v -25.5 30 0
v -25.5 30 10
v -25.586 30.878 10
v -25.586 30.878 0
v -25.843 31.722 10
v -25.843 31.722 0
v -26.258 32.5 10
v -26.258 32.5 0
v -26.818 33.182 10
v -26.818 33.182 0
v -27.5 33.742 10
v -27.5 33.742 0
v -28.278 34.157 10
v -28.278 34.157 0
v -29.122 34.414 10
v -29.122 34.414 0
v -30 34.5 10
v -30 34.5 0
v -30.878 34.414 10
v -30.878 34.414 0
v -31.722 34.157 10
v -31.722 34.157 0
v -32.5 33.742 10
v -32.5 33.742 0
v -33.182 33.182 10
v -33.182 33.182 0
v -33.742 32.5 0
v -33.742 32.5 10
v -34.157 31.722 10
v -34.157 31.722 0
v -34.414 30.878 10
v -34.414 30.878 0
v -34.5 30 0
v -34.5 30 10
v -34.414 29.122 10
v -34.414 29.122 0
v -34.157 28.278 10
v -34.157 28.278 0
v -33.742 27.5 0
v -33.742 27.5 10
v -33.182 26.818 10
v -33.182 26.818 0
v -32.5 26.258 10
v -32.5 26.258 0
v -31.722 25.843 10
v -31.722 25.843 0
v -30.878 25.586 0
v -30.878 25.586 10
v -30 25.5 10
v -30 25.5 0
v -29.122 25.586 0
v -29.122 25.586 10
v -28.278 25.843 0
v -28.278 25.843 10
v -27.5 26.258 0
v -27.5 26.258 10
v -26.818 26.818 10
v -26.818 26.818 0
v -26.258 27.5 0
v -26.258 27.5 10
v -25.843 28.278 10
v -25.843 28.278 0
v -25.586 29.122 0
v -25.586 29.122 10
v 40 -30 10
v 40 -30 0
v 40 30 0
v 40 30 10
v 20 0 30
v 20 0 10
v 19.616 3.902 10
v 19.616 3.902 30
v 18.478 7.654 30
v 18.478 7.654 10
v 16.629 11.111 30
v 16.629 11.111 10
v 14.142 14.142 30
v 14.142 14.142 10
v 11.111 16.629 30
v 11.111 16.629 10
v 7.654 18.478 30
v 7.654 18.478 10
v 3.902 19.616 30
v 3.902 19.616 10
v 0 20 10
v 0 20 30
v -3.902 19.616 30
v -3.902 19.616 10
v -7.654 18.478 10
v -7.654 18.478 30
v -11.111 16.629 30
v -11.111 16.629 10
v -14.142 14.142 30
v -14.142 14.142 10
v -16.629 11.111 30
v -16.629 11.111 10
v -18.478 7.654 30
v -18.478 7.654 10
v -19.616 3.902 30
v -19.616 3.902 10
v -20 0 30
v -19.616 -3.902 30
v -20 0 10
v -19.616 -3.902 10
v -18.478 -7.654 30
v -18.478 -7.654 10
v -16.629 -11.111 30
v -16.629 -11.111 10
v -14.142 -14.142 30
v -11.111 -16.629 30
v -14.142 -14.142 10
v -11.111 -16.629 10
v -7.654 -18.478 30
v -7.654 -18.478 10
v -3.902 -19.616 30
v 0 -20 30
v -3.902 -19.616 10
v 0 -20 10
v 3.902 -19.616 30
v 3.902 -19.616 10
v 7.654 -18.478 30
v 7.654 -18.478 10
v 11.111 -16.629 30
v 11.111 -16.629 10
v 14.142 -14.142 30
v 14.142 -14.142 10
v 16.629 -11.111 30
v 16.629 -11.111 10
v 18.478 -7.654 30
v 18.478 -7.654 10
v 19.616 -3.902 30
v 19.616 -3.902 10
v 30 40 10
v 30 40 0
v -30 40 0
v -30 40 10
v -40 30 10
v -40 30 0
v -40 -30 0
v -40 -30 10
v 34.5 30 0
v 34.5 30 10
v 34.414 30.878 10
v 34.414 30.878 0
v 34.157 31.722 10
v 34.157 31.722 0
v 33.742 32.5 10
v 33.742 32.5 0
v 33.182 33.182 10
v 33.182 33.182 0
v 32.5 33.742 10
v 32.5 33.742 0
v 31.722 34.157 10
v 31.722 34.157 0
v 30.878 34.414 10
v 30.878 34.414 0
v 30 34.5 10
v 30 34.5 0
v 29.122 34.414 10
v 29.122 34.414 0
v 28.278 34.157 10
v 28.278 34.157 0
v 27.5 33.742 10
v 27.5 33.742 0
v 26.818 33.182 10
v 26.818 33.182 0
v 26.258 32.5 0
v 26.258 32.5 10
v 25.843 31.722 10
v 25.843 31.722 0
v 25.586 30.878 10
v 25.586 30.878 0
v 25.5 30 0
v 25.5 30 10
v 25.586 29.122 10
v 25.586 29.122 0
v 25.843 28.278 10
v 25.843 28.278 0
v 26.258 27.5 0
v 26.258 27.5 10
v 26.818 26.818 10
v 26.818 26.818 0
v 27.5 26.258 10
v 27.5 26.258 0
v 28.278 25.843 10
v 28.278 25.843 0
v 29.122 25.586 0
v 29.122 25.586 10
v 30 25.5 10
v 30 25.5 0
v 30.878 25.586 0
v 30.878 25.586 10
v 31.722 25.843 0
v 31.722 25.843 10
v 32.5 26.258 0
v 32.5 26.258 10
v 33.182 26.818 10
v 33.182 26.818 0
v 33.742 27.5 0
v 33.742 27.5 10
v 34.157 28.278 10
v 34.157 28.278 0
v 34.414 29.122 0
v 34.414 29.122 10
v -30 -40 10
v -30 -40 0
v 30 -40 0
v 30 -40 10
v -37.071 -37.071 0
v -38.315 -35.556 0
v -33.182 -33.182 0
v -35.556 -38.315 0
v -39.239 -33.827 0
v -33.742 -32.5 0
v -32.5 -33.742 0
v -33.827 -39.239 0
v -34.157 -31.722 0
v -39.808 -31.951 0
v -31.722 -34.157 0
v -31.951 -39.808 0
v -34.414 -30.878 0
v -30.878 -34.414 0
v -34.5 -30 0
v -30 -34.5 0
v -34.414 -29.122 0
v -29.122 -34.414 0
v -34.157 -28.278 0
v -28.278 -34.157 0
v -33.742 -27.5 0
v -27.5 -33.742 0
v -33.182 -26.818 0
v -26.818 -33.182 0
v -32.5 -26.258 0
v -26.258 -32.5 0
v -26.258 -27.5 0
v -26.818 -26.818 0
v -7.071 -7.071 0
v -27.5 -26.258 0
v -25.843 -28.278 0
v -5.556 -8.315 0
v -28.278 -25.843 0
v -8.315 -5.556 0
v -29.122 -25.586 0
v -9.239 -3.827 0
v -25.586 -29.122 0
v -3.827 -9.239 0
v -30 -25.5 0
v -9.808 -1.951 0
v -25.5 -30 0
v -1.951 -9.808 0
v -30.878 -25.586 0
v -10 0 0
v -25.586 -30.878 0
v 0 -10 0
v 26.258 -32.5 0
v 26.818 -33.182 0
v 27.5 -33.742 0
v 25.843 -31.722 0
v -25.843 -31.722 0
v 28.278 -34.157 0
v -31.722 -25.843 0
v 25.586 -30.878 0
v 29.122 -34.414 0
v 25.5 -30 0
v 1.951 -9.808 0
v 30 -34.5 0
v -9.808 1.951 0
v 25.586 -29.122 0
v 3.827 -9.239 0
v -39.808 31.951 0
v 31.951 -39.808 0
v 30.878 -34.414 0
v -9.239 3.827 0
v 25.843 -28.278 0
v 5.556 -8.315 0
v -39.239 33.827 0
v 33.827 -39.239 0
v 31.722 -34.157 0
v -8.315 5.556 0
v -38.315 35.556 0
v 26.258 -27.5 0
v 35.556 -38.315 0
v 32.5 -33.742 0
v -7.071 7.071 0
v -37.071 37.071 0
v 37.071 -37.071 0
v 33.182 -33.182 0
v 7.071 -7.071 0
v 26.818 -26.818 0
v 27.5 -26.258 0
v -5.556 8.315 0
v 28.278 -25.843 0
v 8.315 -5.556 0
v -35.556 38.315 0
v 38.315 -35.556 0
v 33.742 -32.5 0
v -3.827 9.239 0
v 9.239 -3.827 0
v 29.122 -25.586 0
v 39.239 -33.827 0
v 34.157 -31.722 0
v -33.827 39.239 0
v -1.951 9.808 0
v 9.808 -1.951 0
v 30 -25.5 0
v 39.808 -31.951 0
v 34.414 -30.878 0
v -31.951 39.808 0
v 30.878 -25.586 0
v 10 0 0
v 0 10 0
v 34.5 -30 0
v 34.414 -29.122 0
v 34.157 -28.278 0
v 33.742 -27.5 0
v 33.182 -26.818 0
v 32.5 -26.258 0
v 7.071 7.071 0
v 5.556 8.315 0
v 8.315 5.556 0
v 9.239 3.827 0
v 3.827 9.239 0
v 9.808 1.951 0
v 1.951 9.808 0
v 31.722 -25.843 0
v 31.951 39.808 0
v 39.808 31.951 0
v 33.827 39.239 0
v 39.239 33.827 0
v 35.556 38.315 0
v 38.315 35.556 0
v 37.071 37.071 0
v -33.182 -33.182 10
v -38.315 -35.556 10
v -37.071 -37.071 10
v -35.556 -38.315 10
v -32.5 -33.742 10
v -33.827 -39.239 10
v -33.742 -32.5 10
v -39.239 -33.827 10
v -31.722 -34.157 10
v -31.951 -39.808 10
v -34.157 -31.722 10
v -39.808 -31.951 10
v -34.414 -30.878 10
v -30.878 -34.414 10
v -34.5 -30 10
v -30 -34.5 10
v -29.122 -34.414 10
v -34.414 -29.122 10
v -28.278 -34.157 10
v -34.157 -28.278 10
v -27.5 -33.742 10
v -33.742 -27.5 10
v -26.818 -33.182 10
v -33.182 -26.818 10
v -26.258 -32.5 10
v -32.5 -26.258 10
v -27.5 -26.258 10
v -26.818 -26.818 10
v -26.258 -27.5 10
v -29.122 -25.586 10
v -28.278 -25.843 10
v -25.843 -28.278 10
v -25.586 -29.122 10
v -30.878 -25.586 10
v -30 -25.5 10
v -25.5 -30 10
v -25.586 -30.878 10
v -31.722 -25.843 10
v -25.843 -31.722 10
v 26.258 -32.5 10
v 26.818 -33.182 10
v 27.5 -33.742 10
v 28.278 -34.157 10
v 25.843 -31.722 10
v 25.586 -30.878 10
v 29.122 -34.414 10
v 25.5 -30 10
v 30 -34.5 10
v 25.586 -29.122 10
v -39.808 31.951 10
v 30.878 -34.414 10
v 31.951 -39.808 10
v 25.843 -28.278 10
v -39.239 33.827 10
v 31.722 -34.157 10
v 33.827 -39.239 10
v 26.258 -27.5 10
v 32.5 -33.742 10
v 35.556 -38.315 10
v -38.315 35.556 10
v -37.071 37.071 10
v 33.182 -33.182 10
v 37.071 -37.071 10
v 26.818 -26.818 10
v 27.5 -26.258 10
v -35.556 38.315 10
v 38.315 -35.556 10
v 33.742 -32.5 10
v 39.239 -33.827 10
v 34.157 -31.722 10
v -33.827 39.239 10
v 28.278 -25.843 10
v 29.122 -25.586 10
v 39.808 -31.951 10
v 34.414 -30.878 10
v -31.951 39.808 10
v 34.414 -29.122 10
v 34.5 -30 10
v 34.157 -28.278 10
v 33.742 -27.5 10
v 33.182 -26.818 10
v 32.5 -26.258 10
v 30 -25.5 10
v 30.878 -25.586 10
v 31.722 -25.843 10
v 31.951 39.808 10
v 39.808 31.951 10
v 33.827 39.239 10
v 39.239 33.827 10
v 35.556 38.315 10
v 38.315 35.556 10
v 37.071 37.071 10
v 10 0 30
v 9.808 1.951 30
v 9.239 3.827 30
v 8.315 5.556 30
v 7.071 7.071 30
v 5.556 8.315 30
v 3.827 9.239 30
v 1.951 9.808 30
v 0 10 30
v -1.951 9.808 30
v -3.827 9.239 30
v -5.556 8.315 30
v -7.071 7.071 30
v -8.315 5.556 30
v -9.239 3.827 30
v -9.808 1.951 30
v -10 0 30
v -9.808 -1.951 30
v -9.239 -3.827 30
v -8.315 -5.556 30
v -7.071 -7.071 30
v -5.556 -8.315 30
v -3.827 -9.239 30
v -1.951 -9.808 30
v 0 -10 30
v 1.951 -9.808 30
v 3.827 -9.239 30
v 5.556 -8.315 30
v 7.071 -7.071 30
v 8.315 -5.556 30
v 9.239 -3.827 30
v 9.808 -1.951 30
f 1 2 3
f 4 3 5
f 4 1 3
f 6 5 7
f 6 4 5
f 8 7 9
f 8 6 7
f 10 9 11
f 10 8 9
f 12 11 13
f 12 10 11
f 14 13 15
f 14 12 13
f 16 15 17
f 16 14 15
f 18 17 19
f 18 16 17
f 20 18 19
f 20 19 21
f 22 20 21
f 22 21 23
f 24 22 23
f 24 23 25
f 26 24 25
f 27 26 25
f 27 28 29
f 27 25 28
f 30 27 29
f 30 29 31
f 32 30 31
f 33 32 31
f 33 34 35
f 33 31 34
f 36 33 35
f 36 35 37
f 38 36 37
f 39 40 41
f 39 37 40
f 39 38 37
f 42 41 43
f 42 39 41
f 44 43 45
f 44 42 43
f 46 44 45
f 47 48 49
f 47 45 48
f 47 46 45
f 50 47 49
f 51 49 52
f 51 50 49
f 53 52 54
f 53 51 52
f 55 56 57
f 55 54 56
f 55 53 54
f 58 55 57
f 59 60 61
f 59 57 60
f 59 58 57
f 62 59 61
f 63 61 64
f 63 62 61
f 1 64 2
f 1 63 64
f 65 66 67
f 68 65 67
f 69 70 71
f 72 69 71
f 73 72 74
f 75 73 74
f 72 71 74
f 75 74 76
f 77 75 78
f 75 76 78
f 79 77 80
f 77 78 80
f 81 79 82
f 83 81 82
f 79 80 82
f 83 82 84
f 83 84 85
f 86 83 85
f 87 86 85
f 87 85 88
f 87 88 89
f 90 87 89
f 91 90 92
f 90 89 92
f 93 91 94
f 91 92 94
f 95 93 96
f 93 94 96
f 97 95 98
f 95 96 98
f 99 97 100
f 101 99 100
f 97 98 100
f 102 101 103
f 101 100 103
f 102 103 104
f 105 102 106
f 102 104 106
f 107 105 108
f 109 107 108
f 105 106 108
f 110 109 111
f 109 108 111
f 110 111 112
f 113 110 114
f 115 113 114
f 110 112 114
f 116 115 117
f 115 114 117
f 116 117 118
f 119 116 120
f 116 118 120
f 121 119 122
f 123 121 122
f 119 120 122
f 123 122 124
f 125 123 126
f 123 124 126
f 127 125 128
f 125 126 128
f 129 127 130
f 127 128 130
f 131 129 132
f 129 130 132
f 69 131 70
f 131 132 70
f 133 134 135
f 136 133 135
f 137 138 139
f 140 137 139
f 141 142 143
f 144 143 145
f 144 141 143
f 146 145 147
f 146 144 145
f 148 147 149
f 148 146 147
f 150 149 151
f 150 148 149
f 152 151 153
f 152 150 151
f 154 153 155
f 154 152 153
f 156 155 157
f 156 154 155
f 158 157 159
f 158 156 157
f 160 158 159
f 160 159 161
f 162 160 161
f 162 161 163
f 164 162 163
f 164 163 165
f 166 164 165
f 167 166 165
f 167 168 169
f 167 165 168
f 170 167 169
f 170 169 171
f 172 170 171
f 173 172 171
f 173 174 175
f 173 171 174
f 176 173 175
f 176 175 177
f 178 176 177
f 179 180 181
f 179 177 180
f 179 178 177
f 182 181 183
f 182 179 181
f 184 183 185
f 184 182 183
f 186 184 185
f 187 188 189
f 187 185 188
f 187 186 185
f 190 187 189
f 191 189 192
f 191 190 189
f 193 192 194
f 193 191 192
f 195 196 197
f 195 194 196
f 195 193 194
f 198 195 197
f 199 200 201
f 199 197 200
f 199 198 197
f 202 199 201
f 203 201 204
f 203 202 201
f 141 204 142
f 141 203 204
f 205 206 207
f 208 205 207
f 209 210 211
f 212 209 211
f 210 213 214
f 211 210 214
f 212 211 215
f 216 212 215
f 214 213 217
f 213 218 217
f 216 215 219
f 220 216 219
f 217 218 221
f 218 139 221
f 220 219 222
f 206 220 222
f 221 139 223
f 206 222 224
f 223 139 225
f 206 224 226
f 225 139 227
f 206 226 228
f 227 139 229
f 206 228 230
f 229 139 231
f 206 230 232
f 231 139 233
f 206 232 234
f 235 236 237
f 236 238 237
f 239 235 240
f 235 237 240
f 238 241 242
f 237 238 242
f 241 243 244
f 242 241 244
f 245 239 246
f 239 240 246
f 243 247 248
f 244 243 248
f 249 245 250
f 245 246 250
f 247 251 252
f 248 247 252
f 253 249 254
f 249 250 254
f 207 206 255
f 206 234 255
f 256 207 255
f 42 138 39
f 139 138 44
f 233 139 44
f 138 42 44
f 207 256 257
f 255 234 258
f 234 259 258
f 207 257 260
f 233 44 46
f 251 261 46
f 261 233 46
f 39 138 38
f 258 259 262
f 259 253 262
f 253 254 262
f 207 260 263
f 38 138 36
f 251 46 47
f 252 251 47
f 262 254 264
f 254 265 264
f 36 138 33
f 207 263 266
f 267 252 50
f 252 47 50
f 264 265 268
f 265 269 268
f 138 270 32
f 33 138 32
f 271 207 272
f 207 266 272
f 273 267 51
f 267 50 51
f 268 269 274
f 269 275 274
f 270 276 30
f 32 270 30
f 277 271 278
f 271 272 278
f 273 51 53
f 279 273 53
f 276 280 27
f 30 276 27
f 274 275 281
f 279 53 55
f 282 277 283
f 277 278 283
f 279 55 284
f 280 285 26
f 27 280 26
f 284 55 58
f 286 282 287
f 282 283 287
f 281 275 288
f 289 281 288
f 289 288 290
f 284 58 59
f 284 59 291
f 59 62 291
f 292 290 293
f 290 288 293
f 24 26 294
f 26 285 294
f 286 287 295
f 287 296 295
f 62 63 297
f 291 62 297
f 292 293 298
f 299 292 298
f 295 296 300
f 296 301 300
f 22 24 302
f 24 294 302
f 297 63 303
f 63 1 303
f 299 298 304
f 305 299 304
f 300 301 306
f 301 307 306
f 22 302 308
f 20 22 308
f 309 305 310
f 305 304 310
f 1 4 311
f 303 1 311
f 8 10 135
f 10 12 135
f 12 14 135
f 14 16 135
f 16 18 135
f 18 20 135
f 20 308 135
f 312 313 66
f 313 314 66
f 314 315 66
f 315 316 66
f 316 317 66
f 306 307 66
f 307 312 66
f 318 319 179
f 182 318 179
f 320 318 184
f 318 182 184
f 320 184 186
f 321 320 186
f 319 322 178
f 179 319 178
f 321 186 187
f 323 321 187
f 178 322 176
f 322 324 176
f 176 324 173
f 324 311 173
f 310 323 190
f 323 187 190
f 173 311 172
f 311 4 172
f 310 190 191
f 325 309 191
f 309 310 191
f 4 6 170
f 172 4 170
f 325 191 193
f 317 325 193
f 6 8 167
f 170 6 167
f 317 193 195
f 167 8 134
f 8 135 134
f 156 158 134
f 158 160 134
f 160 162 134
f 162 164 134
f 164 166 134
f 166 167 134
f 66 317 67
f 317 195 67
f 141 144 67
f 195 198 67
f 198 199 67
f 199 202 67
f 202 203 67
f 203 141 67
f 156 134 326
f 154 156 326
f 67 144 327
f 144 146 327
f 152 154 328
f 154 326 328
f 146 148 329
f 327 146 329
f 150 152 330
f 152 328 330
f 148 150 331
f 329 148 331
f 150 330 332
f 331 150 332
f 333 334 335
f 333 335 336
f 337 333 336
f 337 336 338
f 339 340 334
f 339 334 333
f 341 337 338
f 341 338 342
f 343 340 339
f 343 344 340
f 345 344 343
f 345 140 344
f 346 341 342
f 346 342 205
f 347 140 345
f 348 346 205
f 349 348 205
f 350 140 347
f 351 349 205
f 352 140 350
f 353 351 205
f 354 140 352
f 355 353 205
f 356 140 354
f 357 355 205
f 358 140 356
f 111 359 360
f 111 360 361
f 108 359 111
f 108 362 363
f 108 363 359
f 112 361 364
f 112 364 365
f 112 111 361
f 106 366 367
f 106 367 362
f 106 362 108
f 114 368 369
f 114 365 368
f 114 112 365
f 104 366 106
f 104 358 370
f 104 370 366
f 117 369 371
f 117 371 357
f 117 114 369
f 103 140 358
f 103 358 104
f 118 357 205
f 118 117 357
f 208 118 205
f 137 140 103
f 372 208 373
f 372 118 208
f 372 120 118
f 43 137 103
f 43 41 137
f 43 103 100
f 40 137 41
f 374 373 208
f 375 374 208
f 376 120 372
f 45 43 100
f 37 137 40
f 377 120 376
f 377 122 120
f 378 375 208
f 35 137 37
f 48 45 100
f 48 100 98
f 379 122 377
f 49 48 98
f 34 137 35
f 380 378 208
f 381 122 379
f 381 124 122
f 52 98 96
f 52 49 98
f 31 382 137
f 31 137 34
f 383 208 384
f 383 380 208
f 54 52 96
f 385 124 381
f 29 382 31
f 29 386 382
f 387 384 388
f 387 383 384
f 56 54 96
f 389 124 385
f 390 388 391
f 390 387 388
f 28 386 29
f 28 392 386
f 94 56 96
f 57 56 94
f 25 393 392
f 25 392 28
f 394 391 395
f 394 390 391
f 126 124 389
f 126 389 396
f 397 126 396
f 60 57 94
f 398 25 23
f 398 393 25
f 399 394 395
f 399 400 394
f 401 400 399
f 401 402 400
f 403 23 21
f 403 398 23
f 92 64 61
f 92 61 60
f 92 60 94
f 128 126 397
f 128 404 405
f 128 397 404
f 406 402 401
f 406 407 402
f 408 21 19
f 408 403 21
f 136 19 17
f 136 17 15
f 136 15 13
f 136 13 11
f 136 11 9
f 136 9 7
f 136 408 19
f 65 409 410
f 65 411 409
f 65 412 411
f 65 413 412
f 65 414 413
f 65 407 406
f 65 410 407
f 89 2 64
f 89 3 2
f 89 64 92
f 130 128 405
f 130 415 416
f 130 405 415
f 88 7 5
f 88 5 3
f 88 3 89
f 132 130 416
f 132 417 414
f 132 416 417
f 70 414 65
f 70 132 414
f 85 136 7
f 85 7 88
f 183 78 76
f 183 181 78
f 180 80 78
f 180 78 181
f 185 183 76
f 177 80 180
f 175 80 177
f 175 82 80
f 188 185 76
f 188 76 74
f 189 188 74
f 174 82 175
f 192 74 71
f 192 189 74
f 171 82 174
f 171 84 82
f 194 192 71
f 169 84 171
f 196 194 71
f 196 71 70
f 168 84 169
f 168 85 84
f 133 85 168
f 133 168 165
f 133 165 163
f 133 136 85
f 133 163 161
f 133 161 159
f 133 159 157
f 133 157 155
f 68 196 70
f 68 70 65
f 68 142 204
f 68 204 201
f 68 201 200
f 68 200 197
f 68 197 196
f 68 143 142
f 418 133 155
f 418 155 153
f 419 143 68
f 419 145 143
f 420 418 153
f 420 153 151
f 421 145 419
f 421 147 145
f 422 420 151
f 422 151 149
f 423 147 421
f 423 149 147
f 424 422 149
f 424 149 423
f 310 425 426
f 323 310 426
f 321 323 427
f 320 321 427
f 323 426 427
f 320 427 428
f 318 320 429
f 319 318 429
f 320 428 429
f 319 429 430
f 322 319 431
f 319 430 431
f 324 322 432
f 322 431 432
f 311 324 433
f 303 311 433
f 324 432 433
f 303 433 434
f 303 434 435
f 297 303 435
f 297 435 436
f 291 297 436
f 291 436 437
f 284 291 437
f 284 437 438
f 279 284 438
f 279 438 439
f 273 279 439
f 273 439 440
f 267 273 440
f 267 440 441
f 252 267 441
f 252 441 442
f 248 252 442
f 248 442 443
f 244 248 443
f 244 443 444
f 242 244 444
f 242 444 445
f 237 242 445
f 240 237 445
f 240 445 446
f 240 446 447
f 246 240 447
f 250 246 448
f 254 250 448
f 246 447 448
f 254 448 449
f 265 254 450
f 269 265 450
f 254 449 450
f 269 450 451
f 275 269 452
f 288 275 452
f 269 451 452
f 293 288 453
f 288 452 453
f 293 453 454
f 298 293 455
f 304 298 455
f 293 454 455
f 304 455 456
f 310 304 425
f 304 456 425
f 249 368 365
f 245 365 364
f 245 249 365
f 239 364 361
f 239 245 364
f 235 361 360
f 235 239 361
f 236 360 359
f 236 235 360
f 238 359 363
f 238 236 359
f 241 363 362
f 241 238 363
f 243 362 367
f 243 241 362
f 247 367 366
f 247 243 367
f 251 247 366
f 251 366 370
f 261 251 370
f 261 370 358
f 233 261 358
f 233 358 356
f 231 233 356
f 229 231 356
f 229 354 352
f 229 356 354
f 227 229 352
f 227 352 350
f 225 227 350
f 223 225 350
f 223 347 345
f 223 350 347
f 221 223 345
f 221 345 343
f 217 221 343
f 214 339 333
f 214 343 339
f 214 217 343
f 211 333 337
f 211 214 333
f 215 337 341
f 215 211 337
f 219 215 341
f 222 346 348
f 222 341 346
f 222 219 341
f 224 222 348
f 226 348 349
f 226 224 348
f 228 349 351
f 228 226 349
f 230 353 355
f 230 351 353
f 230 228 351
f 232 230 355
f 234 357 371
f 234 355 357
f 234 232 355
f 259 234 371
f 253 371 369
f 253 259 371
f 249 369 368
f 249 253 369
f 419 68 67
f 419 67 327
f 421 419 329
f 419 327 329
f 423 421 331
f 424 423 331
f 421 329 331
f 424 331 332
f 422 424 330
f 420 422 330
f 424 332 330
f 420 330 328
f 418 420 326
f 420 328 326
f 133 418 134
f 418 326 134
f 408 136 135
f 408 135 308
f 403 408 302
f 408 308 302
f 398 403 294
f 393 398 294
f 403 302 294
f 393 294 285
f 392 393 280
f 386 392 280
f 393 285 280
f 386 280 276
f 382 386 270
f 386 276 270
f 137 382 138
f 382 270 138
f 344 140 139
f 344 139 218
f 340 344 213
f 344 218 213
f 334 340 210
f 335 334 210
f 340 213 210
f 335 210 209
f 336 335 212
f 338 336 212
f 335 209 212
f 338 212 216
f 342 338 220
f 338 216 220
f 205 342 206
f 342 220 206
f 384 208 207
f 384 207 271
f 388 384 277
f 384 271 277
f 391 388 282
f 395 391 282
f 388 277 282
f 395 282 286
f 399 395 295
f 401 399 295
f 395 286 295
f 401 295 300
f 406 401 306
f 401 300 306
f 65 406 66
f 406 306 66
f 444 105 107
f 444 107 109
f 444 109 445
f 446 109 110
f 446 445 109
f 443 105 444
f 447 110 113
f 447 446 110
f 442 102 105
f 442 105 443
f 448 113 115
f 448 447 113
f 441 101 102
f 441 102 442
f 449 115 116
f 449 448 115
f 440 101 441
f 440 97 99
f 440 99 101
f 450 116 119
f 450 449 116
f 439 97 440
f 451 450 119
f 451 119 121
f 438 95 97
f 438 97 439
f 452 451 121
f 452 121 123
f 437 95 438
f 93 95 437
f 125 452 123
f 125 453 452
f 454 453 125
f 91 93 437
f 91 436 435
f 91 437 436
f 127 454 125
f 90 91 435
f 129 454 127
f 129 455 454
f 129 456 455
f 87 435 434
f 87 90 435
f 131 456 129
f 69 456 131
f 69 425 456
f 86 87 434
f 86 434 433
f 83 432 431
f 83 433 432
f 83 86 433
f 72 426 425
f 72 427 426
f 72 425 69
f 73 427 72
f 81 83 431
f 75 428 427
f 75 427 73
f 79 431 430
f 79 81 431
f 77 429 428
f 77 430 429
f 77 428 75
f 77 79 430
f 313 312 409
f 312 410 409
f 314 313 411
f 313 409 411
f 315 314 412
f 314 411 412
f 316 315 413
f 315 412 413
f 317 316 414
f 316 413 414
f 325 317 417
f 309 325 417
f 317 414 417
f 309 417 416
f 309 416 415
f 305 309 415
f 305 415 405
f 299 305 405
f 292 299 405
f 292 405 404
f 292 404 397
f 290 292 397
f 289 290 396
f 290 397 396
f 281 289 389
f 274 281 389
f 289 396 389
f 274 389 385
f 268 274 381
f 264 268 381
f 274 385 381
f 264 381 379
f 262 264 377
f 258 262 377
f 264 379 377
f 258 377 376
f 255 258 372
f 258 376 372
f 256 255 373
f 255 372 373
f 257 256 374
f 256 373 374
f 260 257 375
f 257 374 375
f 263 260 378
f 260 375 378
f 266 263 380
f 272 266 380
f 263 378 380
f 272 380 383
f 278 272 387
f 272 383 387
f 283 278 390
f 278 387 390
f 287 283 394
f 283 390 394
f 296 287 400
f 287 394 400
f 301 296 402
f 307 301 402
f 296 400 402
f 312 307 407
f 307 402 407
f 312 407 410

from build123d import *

# Parameters (mm, degrees)
EXTRUDE_1_DEPTH     = 10
SKETCH_2_R          = 20
EXTRUDE_2_DEPTH     = 20
SKETCH_3_R          = 4.5
CUT_EXTRUDE_1_DEPTH = 81
SKETCH_4_R          = 10
CUT_EXTRUDE_2_DEPTH = 65.031242374


with BuildPart() as part:
    # 草图1 → 凸台-拉伸1 (new body)
    with BuildSketch(Plane.XY):
        with BuildLine():
            Line((-30, -40), (30, -40))
            ThreePointArc((30, -40), (37.071067812, -37.071067812), (40, -30))
            Line((40, -30), (40, 30))
            ThreePointArc((40, 30), (37.071067812, 37.071067812), (30, 40))
            Line((30, 40), (-30, 40))
            ThreePointArc((-30, 40), (-37.071067812, 37.071067812), (-40, 30))
            Line((-40, 30), (-40, -30))
            ThreePointArc((-40, -30), (-37.071067812, -37.071067812), (-30, -40))
        make_face()
    extrude(amount=EXTRUDE_1_DEPTH)

    # 草图2 → 凸台-拉伸2 (add)
    with BuildSketch(Plane.XY.offset(10)):
        Circle(SKETCH_2_R)
    extrude(amount=EXTRUDE_2_DEPTH)

    # 草图3 → 切除-拉伸1 (cut, symmetric)
    with BuildSketch(Plane.XY):
        with Locations((30, 30)):
            Circle(SKETCH_3_R)
        with Locations((-30, 30)):
            Circle(SKETCH_3_R)
        with Locations((-30, -30)):
            Circle(SKETCH_3_R)
        with Locations((30, -30)):
            Circle(SKETCH_3_R)
    extrude(amount=CUT_EXTRUDE_1_DEPTH, both=True, mode=Mode.SUBTRACT)

    # 草图4 → 切除-拉伸2 (cut, through all)
    with BuildSketch(Plane.XY.offset(30)):
        Circle(SKETCH_4_R)
    extrude(amount=-CUT_EXTRUDE_2_DEPTH, mode=Mode.SUBTRACT)


solid = part.part
